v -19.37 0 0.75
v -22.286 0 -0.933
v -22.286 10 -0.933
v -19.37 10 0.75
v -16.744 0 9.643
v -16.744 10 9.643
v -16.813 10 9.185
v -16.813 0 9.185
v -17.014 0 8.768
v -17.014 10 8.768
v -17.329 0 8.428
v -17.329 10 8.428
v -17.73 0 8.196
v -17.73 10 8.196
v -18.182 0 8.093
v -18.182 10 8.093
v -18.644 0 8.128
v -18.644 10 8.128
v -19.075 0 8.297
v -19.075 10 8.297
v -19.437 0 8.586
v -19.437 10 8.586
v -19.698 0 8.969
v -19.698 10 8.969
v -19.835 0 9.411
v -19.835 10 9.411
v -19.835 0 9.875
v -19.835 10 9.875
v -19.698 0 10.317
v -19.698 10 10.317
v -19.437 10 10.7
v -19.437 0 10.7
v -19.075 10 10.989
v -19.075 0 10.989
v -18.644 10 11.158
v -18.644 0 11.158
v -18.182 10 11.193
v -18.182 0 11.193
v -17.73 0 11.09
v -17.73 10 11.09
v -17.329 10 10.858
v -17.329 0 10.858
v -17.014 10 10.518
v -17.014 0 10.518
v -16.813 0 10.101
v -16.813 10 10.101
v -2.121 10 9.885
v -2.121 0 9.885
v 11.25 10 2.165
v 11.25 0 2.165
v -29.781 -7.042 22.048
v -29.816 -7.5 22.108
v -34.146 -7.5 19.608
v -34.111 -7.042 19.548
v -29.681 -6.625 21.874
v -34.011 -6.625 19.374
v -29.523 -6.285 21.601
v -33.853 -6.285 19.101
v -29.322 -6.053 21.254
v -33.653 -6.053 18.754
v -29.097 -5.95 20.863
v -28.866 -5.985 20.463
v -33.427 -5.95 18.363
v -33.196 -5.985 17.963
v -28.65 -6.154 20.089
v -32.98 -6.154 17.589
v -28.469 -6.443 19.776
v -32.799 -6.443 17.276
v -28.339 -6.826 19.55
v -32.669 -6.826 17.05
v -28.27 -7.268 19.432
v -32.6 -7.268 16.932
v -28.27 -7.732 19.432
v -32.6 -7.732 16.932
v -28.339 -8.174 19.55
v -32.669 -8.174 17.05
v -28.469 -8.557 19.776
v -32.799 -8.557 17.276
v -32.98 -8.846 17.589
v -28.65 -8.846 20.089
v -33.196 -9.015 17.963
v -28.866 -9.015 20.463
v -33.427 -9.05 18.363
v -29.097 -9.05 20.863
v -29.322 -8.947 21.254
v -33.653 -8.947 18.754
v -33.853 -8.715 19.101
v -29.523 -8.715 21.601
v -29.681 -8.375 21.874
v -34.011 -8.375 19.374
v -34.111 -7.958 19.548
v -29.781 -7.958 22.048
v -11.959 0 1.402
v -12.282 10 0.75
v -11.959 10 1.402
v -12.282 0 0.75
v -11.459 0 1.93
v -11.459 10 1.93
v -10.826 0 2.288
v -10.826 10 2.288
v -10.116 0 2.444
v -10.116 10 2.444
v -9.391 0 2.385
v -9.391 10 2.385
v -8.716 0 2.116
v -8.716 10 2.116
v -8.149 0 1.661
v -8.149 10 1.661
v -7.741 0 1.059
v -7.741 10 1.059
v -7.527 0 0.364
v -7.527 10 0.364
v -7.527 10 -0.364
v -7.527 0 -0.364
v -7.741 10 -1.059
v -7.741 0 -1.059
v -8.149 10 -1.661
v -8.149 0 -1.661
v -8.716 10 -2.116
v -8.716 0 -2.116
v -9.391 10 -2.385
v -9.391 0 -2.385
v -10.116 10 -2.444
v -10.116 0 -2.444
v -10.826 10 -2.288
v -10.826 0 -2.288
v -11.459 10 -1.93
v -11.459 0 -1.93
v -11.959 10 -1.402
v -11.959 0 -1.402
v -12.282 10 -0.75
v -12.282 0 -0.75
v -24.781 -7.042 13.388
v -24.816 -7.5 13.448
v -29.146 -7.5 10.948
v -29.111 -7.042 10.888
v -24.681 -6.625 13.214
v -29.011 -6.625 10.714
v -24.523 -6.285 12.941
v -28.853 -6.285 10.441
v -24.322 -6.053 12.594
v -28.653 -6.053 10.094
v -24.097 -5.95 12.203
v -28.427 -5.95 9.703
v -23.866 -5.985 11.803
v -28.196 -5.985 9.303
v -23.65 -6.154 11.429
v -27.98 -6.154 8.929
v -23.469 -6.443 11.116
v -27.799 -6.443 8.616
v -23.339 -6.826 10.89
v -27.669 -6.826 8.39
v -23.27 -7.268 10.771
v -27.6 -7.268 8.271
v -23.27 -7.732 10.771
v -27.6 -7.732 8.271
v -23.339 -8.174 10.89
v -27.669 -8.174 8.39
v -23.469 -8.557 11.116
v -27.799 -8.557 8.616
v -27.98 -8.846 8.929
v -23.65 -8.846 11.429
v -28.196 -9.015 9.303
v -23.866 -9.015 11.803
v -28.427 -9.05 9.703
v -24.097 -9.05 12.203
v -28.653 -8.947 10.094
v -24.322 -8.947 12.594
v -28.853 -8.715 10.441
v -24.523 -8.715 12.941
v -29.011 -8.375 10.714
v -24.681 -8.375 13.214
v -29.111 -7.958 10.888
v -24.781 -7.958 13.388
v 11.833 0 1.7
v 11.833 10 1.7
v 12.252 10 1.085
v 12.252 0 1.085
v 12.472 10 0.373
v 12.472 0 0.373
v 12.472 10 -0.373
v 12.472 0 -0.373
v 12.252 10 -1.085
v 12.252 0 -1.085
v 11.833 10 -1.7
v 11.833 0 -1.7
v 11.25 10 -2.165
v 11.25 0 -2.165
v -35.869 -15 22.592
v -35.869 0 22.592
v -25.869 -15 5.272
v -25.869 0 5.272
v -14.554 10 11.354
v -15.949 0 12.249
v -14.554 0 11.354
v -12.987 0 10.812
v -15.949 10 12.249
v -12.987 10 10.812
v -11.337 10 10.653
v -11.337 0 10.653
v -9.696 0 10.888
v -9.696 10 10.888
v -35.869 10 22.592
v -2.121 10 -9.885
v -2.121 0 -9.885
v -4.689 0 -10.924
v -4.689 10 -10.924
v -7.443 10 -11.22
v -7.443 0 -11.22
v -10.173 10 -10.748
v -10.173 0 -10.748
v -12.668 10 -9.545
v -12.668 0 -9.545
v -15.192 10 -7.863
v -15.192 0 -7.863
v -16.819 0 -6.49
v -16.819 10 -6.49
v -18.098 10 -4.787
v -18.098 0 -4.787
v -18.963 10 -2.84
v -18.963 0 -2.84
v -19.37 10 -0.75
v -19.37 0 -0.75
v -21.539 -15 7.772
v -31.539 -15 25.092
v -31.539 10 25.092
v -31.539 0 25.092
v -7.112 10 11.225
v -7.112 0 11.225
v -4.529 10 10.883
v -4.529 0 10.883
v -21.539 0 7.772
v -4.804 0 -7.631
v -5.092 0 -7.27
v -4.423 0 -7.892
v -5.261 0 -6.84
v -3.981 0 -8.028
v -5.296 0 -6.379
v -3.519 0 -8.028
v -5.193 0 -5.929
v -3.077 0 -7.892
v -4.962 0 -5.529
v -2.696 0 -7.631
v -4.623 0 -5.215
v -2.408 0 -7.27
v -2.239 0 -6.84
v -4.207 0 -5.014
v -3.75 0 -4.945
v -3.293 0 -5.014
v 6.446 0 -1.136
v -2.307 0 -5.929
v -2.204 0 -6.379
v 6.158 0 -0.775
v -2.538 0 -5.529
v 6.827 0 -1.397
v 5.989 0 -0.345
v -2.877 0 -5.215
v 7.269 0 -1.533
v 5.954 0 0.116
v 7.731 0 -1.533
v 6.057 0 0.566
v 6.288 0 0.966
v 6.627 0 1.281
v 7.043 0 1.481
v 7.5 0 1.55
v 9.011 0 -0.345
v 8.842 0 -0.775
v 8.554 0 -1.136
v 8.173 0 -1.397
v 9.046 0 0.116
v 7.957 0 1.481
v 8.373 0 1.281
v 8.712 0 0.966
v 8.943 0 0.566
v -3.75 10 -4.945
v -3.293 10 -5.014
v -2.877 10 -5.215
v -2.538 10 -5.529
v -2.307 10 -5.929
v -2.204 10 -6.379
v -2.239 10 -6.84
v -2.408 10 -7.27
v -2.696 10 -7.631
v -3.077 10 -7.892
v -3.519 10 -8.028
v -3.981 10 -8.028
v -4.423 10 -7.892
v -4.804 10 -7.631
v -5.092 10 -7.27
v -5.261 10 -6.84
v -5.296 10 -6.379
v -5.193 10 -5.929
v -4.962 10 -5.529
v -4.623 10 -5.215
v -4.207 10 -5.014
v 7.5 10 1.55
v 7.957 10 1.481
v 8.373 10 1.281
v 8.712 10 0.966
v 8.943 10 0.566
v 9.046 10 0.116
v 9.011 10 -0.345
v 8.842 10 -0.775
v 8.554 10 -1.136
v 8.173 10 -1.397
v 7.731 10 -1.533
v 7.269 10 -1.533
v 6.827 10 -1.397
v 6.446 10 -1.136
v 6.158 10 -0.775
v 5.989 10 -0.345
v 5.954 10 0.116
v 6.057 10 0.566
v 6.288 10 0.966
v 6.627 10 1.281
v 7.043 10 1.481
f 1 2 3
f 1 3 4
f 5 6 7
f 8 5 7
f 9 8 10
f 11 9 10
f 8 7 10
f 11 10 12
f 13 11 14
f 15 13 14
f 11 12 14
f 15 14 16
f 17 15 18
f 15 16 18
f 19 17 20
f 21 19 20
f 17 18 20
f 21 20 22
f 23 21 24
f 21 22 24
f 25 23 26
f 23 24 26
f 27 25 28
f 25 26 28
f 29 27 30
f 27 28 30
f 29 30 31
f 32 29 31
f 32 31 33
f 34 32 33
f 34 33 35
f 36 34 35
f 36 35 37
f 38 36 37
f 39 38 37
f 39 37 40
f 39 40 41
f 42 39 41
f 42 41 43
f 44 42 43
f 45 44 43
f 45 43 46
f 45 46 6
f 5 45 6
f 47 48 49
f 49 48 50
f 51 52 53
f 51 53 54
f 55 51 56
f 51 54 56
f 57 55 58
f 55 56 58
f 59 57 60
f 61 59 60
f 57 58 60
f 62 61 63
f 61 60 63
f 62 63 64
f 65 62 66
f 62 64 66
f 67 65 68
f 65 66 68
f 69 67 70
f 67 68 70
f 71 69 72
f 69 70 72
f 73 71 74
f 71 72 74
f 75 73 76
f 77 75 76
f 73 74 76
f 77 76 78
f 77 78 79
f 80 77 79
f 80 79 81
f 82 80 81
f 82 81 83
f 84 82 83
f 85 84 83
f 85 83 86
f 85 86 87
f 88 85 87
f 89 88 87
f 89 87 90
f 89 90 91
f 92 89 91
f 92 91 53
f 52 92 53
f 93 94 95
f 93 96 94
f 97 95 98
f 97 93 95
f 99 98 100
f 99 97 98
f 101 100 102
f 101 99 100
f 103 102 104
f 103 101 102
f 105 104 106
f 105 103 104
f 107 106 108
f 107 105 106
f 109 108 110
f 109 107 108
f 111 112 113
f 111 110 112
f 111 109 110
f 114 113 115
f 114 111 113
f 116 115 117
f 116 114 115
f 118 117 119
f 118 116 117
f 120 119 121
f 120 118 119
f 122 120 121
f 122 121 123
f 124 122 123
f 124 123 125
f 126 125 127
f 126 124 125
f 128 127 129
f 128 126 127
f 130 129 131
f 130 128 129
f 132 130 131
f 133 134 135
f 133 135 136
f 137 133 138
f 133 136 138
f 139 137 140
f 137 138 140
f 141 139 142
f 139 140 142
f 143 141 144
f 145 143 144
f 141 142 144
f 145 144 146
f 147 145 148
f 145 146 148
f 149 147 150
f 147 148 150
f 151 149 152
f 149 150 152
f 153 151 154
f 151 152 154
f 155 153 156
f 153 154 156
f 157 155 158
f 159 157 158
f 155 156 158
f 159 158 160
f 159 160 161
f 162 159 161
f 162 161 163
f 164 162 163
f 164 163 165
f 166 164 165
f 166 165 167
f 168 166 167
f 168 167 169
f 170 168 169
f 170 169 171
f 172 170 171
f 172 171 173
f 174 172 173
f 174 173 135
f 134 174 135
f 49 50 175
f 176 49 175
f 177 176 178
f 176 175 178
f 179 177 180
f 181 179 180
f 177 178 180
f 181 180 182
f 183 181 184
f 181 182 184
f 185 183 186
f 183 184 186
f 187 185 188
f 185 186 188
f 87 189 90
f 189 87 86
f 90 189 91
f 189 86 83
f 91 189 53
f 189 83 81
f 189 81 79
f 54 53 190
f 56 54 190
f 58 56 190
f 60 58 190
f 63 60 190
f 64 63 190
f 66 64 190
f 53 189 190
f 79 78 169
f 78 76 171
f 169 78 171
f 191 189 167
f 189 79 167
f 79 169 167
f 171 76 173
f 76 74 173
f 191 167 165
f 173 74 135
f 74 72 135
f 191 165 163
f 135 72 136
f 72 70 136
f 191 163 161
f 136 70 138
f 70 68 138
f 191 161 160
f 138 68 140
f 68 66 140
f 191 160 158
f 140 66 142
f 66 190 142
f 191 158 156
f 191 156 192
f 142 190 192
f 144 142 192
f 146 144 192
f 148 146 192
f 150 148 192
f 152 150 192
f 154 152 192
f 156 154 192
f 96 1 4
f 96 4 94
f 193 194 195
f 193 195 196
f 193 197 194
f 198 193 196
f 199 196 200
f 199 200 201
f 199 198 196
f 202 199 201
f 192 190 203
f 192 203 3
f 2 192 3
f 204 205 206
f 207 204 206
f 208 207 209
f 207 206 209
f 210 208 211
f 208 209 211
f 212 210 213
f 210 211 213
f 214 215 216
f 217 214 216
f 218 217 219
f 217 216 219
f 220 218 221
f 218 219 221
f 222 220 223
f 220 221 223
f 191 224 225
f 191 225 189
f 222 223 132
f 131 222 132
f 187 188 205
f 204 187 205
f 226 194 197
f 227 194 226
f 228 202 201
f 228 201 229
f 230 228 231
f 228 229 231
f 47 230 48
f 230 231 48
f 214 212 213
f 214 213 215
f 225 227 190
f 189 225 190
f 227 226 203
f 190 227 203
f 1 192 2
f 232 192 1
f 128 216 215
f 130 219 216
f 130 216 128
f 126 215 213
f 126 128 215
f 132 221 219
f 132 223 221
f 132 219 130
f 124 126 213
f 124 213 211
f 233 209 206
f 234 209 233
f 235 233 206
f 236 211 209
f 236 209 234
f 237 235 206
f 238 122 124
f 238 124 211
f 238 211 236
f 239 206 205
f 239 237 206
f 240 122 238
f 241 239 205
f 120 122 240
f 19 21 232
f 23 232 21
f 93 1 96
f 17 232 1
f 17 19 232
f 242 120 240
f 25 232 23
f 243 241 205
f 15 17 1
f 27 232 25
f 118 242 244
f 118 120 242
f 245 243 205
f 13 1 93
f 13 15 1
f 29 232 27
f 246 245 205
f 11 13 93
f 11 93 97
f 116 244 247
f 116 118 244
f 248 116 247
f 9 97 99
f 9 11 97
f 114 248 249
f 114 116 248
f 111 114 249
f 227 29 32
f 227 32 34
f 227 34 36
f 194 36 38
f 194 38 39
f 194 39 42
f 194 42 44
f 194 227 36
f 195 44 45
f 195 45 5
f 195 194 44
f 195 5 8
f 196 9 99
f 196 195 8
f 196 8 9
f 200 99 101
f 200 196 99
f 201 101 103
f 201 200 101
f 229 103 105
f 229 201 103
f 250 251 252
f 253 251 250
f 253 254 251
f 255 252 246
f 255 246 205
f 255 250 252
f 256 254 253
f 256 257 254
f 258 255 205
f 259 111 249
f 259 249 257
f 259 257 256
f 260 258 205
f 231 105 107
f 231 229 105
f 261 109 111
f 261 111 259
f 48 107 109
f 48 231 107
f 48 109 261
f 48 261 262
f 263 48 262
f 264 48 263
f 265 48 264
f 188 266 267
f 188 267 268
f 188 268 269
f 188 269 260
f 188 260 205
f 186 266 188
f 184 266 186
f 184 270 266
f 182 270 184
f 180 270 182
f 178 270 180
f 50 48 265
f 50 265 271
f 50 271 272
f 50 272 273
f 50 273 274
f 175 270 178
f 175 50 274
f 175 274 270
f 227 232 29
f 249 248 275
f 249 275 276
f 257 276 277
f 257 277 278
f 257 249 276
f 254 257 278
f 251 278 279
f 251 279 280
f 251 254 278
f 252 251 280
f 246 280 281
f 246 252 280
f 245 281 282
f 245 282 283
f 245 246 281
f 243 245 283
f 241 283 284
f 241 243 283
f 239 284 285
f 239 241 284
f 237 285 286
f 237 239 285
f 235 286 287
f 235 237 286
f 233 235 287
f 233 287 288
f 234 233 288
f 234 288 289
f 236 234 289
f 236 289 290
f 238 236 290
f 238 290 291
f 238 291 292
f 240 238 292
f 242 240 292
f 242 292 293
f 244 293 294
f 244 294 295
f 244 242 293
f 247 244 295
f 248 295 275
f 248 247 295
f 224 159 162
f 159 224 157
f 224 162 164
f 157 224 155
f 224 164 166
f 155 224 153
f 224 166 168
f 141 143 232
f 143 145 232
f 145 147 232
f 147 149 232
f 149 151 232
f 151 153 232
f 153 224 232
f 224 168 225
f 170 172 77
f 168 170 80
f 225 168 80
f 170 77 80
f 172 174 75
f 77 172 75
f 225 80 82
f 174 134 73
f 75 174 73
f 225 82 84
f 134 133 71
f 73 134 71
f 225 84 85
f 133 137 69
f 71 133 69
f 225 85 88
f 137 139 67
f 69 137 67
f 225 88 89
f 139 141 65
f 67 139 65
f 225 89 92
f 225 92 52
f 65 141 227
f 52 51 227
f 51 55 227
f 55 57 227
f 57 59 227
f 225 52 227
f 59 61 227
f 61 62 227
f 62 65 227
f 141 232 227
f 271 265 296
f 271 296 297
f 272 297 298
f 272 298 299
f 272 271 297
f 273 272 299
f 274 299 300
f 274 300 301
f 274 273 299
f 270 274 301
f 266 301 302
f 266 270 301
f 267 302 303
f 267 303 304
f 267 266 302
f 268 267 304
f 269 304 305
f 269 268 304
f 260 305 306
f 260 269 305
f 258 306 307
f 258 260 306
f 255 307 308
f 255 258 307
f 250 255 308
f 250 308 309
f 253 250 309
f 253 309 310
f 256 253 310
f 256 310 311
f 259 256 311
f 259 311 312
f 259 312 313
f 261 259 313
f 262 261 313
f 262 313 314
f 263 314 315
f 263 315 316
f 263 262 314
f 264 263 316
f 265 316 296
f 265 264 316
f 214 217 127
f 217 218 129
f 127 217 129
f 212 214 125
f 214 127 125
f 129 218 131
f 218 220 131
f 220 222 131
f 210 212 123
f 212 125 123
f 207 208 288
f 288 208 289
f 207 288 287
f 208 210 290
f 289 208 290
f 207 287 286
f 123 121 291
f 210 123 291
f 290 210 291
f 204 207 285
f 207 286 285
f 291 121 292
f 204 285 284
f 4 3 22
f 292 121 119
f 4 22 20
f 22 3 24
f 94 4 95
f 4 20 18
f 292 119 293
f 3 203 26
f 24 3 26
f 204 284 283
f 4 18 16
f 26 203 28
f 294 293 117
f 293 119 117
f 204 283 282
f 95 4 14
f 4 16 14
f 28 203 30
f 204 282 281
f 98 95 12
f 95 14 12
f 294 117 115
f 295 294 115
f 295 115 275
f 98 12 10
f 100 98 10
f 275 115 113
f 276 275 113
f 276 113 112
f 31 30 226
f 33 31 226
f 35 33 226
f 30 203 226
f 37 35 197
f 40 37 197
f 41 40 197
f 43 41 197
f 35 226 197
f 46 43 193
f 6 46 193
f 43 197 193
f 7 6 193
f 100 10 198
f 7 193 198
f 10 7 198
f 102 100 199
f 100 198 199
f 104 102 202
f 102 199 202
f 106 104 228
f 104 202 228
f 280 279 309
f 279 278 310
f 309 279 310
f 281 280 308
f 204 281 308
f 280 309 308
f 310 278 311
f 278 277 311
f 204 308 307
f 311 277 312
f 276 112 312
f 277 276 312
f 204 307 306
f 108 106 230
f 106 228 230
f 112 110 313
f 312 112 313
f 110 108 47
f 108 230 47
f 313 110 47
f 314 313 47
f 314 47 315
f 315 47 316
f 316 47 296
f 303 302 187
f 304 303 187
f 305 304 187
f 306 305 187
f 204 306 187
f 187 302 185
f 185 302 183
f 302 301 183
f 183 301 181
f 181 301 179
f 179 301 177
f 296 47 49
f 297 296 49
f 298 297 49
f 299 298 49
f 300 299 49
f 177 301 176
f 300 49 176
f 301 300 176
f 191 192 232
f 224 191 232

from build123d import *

# Parameters (mm, degrees)
SKETCH1_R                       = 1.55
SKETCH1_R_2                     = 2.45
BOSS_EXTRUDE1_DEPTH             = 10
SKETCH2_W                       = 9.45
SKETCH2_H                       = 1.5
CUT_EXTRUDE1_DEPTH              = 25.542893997
BOSS_EXTRUDE3_DEPTH             = 10
BOSS_EXTRUDE4_DEPTH             = 15
F_3_0MM_CLEARANCE_DOWEL_HOLE2_D = 3.108
F_3_0MM_CLEARANCE_DOWEL_HOLE3_D = 3.108
FILLET2_R                       = 7


with BuildPart() as part:
    # Sketch1 → Boss-Extrude1 (new body)
    with BuildSketch(Plane(origin=(0, 0, 0), x_dir=(1, 0, 0), z_dir=(0, 1, 0))):
        with BuildLine():
            Line((11.25, 2.165063509), (-2.121223771, 9.884943153))
            ThreePointArc((-2.121223771, 9.884943153), (-7.442989886, 11.219511103), (-12.667897108, 9.545411133))
            Line((-12.667897108, 9.545411133), (-15.191606303, 7.863082307))
            ThreePointArc((-15.191606303, 7.863082307), (-19.4, 0), (-15.191606303, -7.863082307))
            Line((-15.191606303, -7.863082307), (-12.667897108, -9.545411133))
            ThreePointArc((-12.667897108, -9.545411133), (-7.442989886, -11.219511103), (-2.121223771, -9.884943153))
            Line((-2.121223771, -9.884943153), (11.25, -2.165063509))
            ThreePointArc((11.25, -2.165063509), (12.5, 0), (11.25, 2.165063509))
        make_face()
        with Locations(Location((7.5, 0, 0), (0, 0, 270))):
            Circle(SKETCH1_R, mode=Mode.SUBTRACT)
        with Locations(Location((-3.75, 6.495190528, 0), (0, 0, 270))):
            Circle(SKETCH1_R, mode=Mode.SUBTRACT)
        with Locations(Location((-9.95, 0, 0), (0, 0, 270))):
            Circle(SKETCH1_R_2, mode=Mode.SUBTRACT)
    extrude(amount=BOSS_EXTRUDE1_DEPTH)

    # Sketch2 → Cut-Extrude1 (cut, through all)
    with BuildSketch(Plane(origin=(0, 10, 0), x_dir=(1, 0, 0), z_dir=(0, 1, 0))):
        with Locations((-14.675, 0)):
            Rectangle(SKETCH2_W, SKETCH2_H)
    extrude(amount=-CUT_EXTRUDE1_DEPTH, mode=Mode.SUBTRACT)

    # Sketch3 → Boss-Extrude3 (add)
    with BuildSketch(Plane.XZ):
        with BuildLine():
            Line((-35.868683143, 22.59247598), (-22.285990587, -0.93343763))
            Line((-22.285990587, -0.93343763), (-19.370191081, 0.75))
            ThreePointArc((-19.370191081, 0.75), (-18.098070975, 4.786589536), (-15.191606303, 7.863082307))
            Line((-15.191606303, 7.863082307), (-12.667897108, 9.545411133))
            Line((-12.667897108, 9.545411133), (-31.538556124, 25.09247598))
            Line((-31.538556124, 25.09247598), (-35.868683143, 22.59247598))
        make_face()
    extrude(amount=-BOSS_EXTRUDE3_DEPTH)

    # Sketch4 → Boss-Extrude4 (add)
    with BuildSketch(Plane(origin=(0, 0, 0), x_dir=(1, 0, 0), z_dir=(0, 1, 0))):
        Polygon((-35.868683143, -22.59247598), (-25.868683143, -5.271967904), (-21.538556124, -7.771967904), (-31.538556124, -25.09247598), align=None)
    extrude(amount=-BOSS_EXTRUDE4_DEPTH)

    # Ø3.0mm Clearance Dowel Hole2 (through all)
    with Locations(Plane(origin=(-12.788556272, 0, -7.383476406), x_dir=(0.5000000000000013, 0, -0.8660254037844379), z_dir=(0.8660254037844379, 0, 0.5000000000000013))):
        with Locations((-22.499999704, -7.5), (-32.499999704, -7.5)):
            Hole(F_3_0MM_CLEARANCE_DOWEL_HOLE2_D / 2)

    # Ø3.0mm Clearance Dowel Hole3 (through all)
    with Locations(Plane(origin=(0, 0, 0), x_dir=(-1, 0, 0), z_dir=(0, -1, 0))):
        with Locations((18.297907491, -9.642957265)):
            Hole(F_3_0MM_CLEARANCE_DOWEL_HOLE3_D / 2)

    # Fillet2
    fillet2_edges = [part.edges().sort_by_distance(p)[0] for p in [
        (-12.667897108, 5, 9.545411133),
    ]]
    fillet(fillet2_edges, radius=FILLET2_R)


solid = part.part
